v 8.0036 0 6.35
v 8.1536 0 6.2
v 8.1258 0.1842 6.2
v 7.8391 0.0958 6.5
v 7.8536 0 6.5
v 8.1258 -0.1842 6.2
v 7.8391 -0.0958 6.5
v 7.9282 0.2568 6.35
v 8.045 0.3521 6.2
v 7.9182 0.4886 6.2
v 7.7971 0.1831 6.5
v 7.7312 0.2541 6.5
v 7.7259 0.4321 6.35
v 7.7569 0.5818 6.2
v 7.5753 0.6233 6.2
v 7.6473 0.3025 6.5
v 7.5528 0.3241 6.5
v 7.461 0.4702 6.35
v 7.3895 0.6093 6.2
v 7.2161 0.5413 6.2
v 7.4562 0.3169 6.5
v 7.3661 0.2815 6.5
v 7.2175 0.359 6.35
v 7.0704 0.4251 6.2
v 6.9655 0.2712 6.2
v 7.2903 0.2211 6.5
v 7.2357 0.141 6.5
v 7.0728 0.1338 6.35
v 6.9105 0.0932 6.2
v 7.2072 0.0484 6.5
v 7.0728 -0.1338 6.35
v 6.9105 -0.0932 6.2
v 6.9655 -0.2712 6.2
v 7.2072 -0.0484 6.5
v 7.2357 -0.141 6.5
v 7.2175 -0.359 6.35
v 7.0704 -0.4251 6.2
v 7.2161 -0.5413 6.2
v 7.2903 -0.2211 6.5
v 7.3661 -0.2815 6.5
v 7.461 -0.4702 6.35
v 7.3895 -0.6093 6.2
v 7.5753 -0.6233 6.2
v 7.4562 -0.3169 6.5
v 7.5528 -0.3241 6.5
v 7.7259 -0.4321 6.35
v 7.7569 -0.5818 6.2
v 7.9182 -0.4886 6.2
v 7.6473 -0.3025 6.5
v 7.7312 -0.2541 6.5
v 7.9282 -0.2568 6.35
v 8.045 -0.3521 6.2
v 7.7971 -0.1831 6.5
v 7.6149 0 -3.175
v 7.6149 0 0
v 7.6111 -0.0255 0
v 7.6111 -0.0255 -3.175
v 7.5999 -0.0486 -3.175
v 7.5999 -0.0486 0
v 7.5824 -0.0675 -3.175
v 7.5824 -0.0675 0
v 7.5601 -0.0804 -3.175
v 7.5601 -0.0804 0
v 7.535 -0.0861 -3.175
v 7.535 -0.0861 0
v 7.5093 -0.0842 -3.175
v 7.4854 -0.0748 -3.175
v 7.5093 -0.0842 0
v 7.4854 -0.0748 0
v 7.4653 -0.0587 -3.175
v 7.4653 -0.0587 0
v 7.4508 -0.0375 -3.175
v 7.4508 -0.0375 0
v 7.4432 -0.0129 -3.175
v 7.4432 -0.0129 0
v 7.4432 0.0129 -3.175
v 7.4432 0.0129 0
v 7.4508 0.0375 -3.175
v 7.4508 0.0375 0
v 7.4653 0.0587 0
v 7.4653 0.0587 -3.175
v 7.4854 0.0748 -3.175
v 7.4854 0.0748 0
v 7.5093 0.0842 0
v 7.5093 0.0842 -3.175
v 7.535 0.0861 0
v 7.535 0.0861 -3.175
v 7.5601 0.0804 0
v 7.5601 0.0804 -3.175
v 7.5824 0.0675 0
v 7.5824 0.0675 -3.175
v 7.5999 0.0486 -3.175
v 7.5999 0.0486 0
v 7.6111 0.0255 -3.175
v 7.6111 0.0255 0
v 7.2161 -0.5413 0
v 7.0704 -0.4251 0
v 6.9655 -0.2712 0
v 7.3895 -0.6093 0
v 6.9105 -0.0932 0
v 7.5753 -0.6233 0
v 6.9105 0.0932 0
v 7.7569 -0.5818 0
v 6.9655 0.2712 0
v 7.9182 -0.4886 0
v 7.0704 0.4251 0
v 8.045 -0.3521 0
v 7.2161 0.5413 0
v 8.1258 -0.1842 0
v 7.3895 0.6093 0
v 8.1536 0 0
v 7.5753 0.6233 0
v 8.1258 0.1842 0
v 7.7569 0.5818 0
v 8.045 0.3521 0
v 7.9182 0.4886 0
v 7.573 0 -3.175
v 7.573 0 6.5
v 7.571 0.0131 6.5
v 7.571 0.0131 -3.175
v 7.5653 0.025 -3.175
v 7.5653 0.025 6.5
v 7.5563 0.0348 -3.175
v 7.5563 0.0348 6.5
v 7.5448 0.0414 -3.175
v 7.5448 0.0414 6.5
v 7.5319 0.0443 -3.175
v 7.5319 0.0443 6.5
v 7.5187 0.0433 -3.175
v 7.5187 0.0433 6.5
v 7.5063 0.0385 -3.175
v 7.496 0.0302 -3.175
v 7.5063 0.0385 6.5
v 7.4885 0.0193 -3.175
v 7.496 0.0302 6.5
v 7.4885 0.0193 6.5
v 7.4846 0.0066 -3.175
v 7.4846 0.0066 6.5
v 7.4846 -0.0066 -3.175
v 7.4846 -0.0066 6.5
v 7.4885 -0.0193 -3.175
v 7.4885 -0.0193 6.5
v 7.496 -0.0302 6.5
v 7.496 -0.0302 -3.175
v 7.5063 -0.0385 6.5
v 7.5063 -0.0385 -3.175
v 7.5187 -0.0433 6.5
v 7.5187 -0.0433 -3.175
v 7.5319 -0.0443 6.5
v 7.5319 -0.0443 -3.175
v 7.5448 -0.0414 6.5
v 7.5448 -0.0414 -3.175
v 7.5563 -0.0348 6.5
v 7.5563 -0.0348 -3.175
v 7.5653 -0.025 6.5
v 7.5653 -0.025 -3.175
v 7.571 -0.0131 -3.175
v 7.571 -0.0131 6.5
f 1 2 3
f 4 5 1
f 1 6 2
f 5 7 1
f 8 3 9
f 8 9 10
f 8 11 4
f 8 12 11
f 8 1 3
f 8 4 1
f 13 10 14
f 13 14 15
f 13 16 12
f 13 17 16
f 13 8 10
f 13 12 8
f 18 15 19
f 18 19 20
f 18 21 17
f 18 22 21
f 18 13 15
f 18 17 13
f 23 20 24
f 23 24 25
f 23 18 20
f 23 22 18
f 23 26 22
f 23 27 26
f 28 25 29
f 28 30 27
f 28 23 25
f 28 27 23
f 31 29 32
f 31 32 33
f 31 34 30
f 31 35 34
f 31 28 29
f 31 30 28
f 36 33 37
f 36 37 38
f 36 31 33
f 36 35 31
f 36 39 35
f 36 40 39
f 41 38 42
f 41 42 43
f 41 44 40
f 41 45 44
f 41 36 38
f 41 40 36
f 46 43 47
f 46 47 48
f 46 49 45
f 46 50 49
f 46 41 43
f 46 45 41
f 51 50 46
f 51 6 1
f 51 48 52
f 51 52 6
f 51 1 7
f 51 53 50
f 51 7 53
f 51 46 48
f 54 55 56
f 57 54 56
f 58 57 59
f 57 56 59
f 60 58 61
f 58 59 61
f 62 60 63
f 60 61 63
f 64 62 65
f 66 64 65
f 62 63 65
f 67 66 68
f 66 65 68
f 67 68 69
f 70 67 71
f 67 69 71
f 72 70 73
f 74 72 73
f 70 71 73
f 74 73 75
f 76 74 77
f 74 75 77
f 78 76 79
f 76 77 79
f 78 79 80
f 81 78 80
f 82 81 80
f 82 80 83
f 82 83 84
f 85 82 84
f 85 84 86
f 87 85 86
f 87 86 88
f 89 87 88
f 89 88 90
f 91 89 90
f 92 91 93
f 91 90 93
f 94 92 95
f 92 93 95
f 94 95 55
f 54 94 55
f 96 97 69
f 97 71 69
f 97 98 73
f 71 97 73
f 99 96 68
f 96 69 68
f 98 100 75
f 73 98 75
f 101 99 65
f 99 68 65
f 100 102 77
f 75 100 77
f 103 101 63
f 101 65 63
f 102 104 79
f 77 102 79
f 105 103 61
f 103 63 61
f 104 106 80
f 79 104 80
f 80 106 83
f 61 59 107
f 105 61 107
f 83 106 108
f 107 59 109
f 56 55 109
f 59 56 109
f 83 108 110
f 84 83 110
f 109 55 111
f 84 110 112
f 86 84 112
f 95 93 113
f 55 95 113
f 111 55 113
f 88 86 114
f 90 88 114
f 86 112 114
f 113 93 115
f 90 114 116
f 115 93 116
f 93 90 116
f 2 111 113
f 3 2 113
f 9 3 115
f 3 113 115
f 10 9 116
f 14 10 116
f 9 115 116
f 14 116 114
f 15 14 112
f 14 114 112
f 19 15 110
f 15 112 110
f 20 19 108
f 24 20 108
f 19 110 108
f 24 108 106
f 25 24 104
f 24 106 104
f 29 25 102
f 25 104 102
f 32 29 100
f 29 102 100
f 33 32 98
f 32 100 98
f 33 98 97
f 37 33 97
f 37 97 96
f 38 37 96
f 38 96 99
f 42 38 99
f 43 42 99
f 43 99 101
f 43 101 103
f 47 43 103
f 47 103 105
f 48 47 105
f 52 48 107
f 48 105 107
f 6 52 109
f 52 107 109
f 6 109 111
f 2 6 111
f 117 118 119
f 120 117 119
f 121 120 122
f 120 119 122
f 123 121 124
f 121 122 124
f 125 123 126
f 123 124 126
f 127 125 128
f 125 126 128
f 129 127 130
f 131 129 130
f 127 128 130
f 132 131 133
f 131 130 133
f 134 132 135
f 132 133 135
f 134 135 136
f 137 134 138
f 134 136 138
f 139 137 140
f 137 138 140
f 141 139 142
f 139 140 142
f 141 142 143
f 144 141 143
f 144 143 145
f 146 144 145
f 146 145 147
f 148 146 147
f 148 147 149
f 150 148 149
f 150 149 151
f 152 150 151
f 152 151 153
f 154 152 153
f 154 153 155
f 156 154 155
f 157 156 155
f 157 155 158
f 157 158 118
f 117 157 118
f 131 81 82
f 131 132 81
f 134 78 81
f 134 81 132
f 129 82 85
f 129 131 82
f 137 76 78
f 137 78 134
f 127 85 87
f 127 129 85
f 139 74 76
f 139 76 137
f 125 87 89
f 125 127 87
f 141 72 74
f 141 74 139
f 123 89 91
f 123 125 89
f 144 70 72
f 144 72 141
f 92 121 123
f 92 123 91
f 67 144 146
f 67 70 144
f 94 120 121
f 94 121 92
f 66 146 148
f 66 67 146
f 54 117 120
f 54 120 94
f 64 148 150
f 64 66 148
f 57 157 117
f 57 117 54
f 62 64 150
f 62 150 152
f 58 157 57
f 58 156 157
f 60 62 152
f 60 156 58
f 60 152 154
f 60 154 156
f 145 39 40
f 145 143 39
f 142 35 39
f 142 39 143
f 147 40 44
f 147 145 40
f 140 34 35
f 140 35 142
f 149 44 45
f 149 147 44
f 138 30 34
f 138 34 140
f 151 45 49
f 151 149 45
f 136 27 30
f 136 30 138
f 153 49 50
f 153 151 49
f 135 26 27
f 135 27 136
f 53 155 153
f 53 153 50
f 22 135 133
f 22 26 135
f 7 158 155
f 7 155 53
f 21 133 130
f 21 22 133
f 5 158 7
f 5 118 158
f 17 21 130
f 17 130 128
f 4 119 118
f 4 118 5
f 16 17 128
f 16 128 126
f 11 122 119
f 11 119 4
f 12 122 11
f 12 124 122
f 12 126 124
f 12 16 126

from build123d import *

# Parameters (mm, degrees)
SKETCH002_R  = 0.625
PAD001_DEPTH = 6.5
CHAMFER_SIZE = 0.3
SKETCH004_R  = 0.08636
PAD002_DEPTH = 3.175
SKETCH003_R  = 0.04445
POCKET_DEPTH = 9.676


with BuildPart() as part:
    # Sketch002 → Pad001 (new body)
    with BuildSketch(Plane.XY):
        Circle(SKETCH002_R)
    extrude(amount=PAD001_DEPTH)

    # Chamfer
    chamfer_edges = [part.edges().sort_by_distance(p)[0] for p in [
        (-0.625, 0, 6.5),
    ]]
    chamfer(chamfer_edges, length=CHAMFER_SIZE)

    # Sketch004 (on Face3 of Chamfer) → Pad002 (join)
    with BuildSketch(Plane(origin=(0, 0, 0), x_dir=(1, 0, 0), z_dir=(0, 0, -1))):
        Circle(SKETCH004_R)
    extrude(amount=PAD002_DEPTH)

    # Sketch003 (on Face4 of Chamfer) → Pocket (cut, through all)
    with BuildSketch(Plane.XY.offset(6.5)):
        Circle(SKETCH003_R)
    extrude(amount=-POCKET_DEPTH, mode=Mode.SUBTRACT)


with BuildPart() as part_1:
    # Body001 placement: moved
    add(part.part.moved(Location((7.52856, 0, 0))))


solid = part_1.part
